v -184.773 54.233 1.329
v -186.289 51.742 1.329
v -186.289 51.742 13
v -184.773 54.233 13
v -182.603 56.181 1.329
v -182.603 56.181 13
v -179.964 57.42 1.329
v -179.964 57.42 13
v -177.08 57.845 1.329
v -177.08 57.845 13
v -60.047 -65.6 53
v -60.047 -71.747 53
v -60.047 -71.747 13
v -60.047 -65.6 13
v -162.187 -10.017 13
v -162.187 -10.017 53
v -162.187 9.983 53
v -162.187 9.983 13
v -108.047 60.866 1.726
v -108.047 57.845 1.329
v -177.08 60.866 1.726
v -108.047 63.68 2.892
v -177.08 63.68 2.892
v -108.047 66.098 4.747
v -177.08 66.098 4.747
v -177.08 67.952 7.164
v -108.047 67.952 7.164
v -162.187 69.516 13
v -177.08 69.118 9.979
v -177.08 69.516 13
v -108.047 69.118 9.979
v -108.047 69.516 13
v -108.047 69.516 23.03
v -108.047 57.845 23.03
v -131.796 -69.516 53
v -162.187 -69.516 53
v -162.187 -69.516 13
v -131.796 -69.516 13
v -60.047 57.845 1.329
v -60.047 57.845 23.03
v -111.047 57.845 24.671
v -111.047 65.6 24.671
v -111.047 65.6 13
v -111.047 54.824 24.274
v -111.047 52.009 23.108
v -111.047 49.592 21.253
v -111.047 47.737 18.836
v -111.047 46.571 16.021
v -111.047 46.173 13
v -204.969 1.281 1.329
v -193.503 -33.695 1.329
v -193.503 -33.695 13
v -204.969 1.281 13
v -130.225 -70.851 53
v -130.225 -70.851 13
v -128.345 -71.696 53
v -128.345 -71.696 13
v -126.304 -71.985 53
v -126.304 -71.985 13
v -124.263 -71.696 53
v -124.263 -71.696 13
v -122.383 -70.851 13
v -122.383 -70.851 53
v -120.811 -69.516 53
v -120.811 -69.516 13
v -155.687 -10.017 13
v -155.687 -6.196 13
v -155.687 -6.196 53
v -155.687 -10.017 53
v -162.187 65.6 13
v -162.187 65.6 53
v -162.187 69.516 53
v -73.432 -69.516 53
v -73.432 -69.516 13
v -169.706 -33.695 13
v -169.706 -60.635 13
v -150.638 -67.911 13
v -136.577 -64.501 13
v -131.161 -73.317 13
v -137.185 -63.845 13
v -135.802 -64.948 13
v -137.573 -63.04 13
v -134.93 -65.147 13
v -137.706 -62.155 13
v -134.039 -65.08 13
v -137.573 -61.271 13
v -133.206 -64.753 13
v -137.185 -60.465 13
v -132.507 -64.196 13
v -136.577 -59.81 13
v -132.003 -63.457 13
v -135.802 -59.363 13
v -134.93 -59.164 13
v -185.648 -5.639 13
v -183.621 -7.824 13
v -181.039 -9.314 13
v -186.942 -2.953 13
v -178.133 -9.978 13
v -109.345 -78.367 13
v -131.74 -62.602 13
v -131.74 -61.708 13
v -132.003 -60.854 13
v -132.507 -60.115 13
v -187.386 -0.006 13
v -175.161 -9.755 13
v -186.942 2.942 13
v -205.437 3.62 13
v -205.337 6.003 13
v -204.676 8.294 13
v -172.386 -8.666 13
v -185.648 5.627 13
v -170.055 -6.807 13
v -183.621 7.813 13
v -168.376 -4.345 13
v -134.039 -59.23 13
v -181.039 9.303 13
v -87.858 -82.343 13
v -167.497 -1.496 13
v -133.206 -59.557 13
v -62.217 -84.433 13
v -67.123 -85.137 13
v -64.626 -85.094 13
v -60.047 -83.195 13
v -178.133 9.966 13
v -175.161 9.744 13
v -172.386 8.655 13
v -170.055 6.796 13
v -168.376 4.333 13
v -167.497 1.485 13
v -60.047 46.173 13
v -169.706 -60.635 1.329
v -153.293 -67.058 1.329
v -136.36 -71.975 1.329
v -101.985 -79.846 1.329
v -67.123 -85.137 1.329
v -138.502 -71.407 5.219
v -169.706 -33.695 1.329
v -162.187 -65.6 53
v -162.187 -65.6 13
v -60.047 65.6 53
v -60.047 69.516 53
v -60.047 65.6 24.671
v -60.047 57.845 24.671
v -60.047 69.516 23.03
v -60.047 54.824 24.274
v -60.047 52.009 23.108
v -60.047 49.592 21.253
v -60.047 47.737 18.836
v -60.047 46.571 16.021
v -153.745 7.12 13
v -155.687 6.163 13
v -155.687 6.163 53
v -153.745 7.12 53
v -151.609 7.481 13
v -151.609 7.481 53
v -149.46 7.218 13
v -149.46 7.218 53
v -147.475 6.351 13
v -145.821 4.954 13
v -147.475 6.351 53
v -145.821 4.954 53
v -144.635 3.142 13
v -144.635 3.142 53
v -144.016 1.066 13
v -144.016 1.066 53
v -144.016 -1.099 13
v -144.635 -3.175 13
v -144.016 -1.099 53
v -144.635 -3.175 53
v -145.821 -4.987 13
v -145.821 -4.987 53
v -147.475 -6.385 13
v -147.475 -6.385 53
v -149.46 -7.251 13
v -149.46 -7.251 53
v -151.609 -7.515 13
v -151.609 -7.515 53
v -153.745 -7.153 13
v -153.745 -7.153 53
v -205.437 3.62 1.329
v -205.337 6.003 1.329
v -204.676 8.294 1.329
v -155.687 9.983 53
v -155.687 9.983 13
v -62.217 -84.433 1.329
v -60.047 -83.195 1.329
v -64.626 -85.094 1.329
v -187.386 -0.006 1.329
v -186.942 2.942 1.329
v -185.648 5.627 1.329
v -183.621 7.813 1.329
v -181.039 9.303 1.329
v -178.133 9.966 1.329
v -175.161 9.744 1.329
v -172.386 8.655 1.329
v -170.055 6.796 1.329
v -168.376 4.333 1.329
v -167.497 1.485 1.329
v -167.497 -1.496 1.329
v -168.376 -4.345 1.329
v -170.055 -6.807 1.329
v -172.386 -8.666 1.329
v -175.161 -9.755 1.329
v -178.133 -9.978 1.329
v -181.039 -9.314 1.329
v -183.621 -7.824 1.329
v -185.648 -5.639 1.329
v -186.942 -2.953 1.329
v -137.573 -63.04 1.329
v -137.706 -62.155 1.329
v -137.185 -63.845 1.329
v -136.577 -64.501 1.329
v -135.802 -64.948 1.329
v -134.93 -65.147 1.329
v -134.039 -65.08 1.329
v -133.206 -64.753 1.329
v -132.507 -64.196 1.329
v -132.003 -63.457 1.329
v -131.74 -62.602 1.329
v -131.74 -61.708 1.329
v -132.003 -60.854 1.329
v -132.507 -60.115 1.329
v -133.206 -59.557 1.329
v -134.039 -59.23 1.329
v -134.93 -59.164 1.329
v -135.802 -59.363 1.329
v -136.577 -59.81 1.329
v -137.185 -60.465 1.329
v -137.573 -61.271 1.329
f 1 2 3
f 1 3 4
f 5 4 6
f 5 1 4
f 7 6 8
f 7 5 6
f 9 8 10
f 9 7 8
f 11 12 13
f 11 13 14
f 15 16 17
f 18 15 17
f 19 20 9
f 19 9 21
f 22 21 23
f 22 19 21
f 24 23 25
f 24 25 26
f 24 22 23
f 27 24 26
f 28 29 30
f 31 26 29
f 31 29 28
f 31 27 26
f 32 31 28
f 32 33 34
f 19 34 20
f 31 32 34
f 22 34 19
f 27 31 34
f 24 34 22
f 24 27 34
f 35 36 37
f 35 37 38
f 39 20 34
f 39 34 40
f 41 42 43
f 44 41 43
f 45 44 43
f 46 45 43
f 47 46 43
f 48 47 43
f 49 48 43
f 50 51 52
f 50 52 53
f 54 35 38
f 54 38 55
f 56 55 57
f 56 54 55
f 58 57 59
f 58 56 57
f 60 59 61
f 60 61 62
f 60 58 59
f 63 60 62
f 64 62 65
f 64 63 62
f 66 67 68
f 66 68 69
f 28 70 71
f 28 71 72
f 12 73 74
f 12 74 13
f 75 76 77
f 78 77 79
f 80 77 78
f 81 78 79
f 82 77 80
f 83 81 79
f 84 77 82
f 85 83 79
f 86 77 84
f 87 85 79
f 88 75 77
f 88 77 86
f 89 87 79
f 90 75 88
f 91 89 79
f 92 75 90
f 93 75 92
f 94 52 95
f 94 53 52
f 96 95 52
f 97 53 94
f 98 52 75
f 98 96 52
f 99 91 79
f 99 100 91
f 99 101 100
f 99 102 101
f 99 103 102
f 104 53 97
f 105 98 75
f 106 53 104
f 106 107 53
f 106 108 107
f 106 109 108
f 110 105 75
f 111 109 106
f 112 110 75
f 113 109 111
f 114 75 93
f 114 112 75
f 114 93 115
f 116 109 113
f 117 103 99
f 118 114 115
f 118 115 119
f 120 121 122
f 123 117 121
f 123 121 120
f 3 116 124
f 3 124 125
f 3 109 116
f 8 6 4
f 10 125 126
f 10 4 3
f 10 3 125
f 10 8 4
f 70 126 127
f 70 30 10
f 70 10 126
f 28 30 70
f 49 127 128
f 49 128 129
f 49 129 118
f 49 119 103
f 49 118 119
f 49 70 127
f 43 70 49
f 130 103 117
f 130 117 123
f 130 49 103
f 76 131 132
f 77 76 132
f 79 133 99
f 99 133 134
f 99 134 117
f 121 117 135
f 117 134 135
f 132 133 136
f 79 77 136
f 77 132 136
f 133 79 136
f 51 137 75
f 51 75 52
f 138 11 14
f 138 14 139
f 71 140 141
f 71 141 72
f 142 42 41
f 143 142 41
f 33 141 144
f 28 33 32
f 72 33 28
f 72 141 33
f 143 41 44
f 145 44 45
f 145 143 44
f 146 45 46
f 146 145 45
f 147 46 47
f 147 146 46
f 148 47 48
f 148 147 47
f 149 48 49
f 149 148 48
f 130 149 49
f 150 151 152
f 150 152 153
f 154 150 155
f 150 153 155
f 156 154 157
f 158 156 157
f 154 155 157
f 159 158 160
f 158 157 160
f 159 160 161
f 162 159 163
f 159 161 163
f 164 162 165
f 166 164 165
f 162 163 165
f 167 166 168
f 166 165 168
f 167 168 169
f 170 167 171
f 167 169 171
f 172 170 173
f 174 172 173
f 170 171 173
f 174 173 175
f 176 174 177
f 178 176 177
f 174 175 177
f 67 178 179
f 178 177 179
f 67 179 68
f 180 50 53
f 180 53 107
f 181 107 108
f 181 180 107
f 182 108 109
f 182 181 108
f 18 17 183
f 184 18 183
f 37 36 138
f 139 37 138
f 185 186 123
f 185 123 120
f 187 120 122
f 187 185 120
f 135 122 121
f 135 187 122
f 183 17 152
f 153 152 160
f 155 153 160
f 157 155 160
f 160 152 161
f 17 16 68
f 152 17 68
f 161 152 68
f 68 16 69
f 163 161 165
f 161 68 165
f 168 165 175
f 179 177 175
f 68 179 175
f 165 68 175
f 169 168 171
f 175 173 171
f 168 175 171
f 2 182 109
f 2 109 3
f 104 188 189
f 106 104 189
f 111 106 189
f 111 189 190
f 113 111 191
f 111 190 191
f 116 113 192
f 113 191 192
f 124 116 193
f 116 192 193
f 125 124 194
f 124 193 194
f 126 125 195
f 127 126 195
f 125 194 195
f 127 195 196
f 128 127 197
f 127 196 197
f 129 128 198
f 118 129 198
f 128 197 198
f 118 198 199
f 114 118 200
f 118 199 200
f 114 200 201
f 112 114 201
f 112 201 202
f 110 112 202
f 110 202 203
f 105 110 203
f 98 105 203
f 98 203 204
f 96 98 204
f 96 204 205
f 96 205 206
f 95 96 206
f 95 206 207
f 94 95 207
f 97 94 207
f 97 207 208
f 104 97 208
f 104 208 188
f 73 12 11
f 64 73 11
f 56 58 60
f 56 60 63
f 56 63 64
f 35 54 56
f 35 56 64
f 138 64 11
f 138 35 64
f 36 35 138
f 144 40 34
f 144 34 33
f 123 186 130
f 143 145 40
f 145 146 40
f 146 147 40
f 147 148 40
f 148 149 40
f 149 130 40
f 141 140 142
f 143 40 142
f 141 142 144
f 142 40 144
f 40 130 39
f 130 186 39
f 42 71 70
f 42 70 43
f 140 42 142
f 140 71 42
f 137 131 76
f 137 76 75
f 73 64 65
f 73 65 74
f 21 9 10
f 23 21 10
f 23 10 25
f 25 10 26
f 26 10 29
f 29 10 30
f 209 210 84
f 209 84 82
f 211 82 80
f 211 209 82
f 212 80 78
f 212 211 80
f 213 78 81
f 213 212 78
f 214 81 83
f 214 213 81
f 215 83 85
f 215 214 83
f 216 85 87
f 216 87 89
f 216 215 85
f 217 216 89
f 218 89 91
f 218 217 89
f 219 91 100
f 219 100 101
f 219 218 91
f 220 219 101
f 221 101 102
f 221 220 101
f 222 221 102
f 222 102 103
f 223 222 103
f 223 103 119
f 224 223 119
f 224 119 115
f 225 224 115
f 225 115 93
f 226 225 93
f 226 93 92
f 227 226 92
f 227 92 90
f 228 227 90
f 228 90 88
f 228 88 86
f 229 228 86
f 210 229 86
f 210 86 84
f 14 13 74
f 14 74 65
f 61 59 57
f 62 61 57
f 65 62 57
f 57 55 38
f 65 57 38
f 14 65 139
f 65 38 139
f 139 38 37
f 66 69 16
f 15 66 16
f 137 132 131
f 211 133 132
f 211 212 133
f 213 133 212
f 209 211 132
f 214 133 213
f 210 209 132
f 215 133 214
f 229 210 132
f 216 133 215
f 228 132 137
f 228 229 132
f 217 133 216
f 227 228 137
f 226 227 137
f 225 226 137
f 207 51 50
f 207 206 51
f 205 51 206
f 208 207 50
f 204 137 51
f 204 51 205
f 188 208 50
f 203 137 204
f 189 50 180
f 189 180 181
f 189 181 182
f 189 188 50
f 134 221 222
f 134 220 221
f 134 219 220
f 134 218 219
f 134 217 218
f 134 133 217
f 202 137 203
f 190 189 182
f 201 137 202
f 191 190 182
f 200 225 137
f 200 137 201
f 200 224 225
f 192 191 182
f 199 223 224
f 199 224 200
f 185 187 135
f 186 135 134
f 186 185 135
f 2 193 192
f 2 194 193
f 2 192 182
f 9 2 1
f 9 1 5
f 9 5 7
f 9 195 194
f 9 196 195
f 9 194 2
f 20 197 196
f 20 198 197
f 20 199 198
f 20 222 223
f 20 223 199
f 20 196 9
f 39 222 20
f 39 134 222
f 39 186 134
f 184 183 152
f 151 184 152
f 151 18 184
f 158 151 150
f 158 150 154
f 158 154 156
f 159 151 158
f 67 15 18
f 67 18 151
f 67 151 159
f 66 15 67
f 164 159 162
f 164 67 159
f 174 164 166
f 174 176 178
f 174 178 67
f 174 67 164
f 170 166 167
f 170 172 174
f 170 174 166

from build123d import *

# Parameters (mm, degrees)
EXTRUDE_1_DEPTH     = 40
EXTRUDE_1_2_DEPTH   = 40
EXTRUDE_1_3_DEPTH   = 40
SKETCH_2_R          = 3
EXTRUDE_2_DEPTH     = 13
EXTRUDE_3_DEPTH     = 148.86088
EXTRUDE_4_DEPTH     = 55
SKETCH_6_W          = 23.030106463
SKETCH_6_H          = 11.671315475
CUT_EXTRUDE_1_DEPTH = 52
SKETCH_7_W          = 1.171392603
SKETCH_7_H          = 3.916398917
CUT_EXTRUDE_2_DEPTH = 52
SKETCH_8_W          = 1.171392603
SKETCH_8_H          = 7.044464959
CUT_EXTRUDE_3_DEPTH = 52
CUT_EXTRUDE_4_DEPTH = 40
SKETCH_11_W         = 1.328684526
SKETCH_11_H         = 148.506593242
CUT_EXTRUDE_5_DEPTH = 160
SKETCH_12_W         = 4
SKETCH_12_H         = 162.281264585
CUT_EXTRUDE_6_DEPTH = 160
SKETCH_13_R         = 10
CUT_EXTRUDE_8_DEPTH = 32
SKETCH_14_W         = 27.828077966
SKETCH_14_H         = 11.671315475
CUT_EXTRUDE_9_DEPTH = 18


with BuildPart() as part:
    # Эскиз3 → Бобышка-Вытянуть1 (new body)
    with BuildSketch(Plane(origin=(0, 0, 53), x_dir=(-1, 0, 0), z_dir=(0, 0, 1))):
        Polygon((54.875373692, -65.599681844), (54.875373692, -69.516080761), (204.631843366, -69.516080761), (204.907646106, -65.599681844), align=None)
    extrude(amount=-EXTRUDE_1_DEPTH)



with BuildPart() as body_2:
    # Эскиз3 → Extrude 1 2 (new body)
    with BuildSketch(Plane(origin=(0, 0, 53), x_dir=(-1, 0, 0), z_dir=(0, 0, 1))):
        with BuildLine():
            Line((54.875373692, 72.608931758), (54.875373692, 65.599681844))
            Line((54.875373692, 65.599681844), (133.584399888, 65.599681844))
            Line((133.584399888, 65.599681844), (204.907646106, 65.599681844))
            Line((204.907646106, 65.599681844), (204.631843366, 69.516080761))
            Line((204.631843366, 69.516080761), (131.796304317, 69.516080761))
            ThreePointArc((131.796304317, 69.516080761), (126.303865044, 71.985274815), (120.811425771, 69.516080761))
            Line((120.811425771, 69.516080761), (73.432479677, 69.516080761))
            Line((73.432479677, 69.516080761), (54.875373692, 72.608931758))
        make_face()
    extrude(amount=-EXTRUDE_1_2_DEPTH)

    # Эскиз8 → Вырез-Вытянуть3 (cut)
    with BuildSketch(Plane(origin=(0, 0, 13), x_dir=(-1, 0, 0), z_dir=(0, 0, -1))):
        with Locations((55.461069994, -69.121914323)):
            Rectangle(SKETCH_8_W, SKETCH_8_H)
    extrude(amount=-CUT_EXTRUDE_3_DEPTH, mode=Mode.SUBTRACT)


with BuildPart() as body_3:
    # Эскиз3 → Extrude 1 3 (new body)
    with BuildSketch(Plane(origin=(0, 0, 53), x_dir=(-1, 0, 0), z_dir=(0, 0, 1))):
        with BuildLine():
            Line((155.687413664, 10.016575084), (162.186830452, 10.016575084))
            Line((162.186830452, 10.016575084), (162.186830452, -9.983424916))
            Line((162.186830452, -9.983424916), (155.687413664, -9.983424916))
            Line((155.687413664, -9.983424916), (155.687413664, -6.162827902))
            ThreePointArc((155.687413664, -6.162827902), (143.937122058, 0.016575084), (155.687413664, 6.19597807))
            Line((155.687413664, 6.19597807), (155.687413664, 10.016575084))
        make_face()
    extrude(amount=-EXTRUDE_1_3_DEPTH)


with BuildPart() as body_4:
    # Эскиз2 → Бобышка-Вытянуть2 (new body)
    with BuildSketch(Plane.XY):
        with BuildLine():
            Line((-56.046766295, 57.844765286), (-56.046766295, -75.195150142))
            ThreePointArc((-56.046766295, -75.195150142), (-59.367136966, -82.637095589), (-67.123276701, -85.137037556))
            add(Edge.make_bspline(
                [(-169.706213848, -60.635244362), (-159.663451251, -65.329375592), (-148.333852624, -68.807240721), (-114.322706555, -77.808926564), (-90.368141829, -82.620076926), (-67.123276701, -85.137037556)],
                knots=[0.055135266, 0.055135266, 0.055135266, 0.055135266, 0.172676281, 0.181905401, 0.42983809, 0.42983809, 0.42983809, 0.42983809], degree=3))
            Line((-169.706213848, -60.635244362), (-169.706213848, -33.694561876))
            Line((-169.706213848, -33.694561876), (-193.502816731, -33.694561876))
            Line((-193.502816731, -33.694561876), (-204.96911778, 1.281363609))
            ThreePointArc((-204.96911778, 1.281363609), (-205.458000207, 4.814198713), (-204.675999382, 8.293912006))
            Line((-204.675999382, 8.293912006), (-186.288842912, 51.742105172))
            ThreePointArc((-186.288842912, 51.742105172), (-182.603452695, 56.180633533), (-177.07956814, 57.844765286))
            Line((-177.07956814, 57.844765286), (-56.046766295, 57.844765286))
        make_face()
        with Locations(Location((-134.706213848, -62.155234714, 0), (0, 0, 180))):
            Circle(SKETCH_2_R, mode=Mode.SUBTRACT)
    extrude(amount=EXTRUDE_2_DEPTH)


with BuildPart() as part_1:
    add(part.part)

    add(body_4.part)  # Бобышка-Вытянуть3 merges body 4
    # Эскиз4 → Бобышка-Вытянуть3 (add)
    with BuildSketch(Plane(origin=(-56.046766295, 0, 0), x_dir=(0, 0, -1), z_dir=(1, 0, 0))):
        with BuildLine():
            Line((-21.7224351, 65.599681844), (-13, 65.599681844))
            Line((-13, 65.599681844), (-13, 57.844765286))
            Line((-13, 57.844765286), (-1.328684526, 57.844765286))
            ThreePointArc((-1.328684526, 57.844765286), (-8.851668218, 68.753979205), (-21.7224351, 65.599681844))
        make_face()
    extrude(amount=-EXTRUDE_3_DEPTH)

    # Эскиз5 → Бобышка-Вытянуть4 (add)
    with BuildSketch(Plane(origin=(-56.046766295, 0, 0), x_dir=(0, 0, -1), z_dir=(1, 0, 0))):
        with BuildLine():
            Line((-13, 69.516080761), (-24.671315474, 69.516080761))
            Line((-24.671315474, 69.516080761), (-24.671315474, 57.844765286))
            ThreePointArc((-24.671315474, 57.844765286), (-4.747133683, 49.591898969), (-13, 69.516080761))
        make_face()
    extrude(amount=-EXTRUDE_4_DEPTH)

    # Эскиз6 → Вырез-Вытянуть1 (cut)
    with BuildSketch(Plane(origin=(-56.046766295, 0, 0), x_dir=(0, 0, -1), z_dir=(1, 0, 0))):
        with Locations((-11.515053232, 63.680423023)):
            Rectangle(SKETCH_6_W, SKETCH_6_H)
    extrude(amount=-CUT_EXTRUDE_1_DEPTH, mode=Mode.SUBTRACT)

    # Эскиз7 → Вырез-Вытянуть2 (cut)
    with BuildSketch(Plane(origin=(0, 0, 13), x_dir=(-1, 0, 0), z_dir=(0, 0, -1))):
        with Locations((55.461069994, 67.557881302)):
            Rectangle(SKETCH_7_W, SKETCH_7_H)
    extrude(amount=-CUT_EXTRUDE_2_DEPTH, mode=Mode.SUBTRACT)


with BuildPart() as cut_extrude_4_tool:
    # Эскиз9 → Вырез-Вытянуть4 (new body)
    with BuildSketch(Plane.XY.offset(53)):
        Polygon((-162.186830452, 9.812396247), (-162.186830452, 78.38916829), (-213.765652488, 78.38916829), (-213.765652488, -81.254607488), (-162.186830452, -81.254607488), align=None)
    extrude(amount=-CUT_EXTRUDE_4_DEPTH)


with BuildPart() as part_2:
    add(part_1.part)

    # Вырез-Вытянуть4: cut by cut_extrude_4_tool
    add(cut_extrude_4_tool.part, mode=Mode.SUBTRACT)

    # Эскиз11 → Вырез-Вытянуть5 (cut)
    with BuildSketch(Plane(origin=(-56.046766295, 0, 0), x_dir=(0, 0, -1), z_dir=(1, 0, 0))):
        with Locations((-0.664342263, -16.408531335)):
            Rectangle(SKETCH_11_W, SKETCH_11_H)
    extrude(amount=-CUT_EXTRUDE_5_DEPTH, mode=Mode.SUBTRACT)


with BuildPart() as body_2_1:
    add(body_2.part)

    # Вырез-Вытянуть4: cut by cut_extrude_4_tool
    add(cut_extrude_4_tool.part, mode=Mode.SUBTRACT)


with BuildPart() as cut_extrude_6_tool:
    # Эскиз12 → Вырез-Вытянуть6 (new body)
    with BuildSketch(Plane(origin=(0, 0, 1.328684526), x_dir=(-1, 0, 0), z_dir=(0, 0, -1))):
        with Locations((58.046766295, -11.624551532)):
            Rectangle(SKETCH_12_W, SKETCH_12_H)
    extrude(amount=-CUT_EXTRUDE_6_DEPTH)


with BuildPart() as part_3:
    add(part_2.part)

    # Вырез-Вытянуть6: cut by cut_extrude_6_tool
    add(cut_extrude_6_tool.part, mode=Mode.SUBTRACT)

    # Эскиз13 → Вырез-Вытянуть8 (cut)
    with BuildSketch(Plane(origin=(0, 0, 1.328684526), x_dir=(-1, 0, 0), z_dir=(0, 0, -1))):
        with Locations((177.385777156, -0.005707992)):
            Circle(SKETCH_13_R)
    extrude(amount=-CUT_EXTRUDE_8_DEPTH, mode=Mode.SUBTRACT)

    # Эскиз14 → Вырез-Вытянуть9 (cut)
    with BuildSketch(Plane.XY.offset(13)):
        with Locations((-190.993607123, 63.680423023)):
            Rectangle(SKETCH_14_W, SKETCH_14_H)
    extrude(amount=-CUT_EXTRUDE_9_DEPTH, mode=Mode.SUBTRACT)


with BuildPart() as body_2_2:
    add(body_2_1.part)

    # Вырез-Вытянуть6: cut by cut_extrude_6_tool
    add(cut_extrude_6_tool.part, mode=Mode.SUBTRACT)


solid = Compound([body_3.part, part_3.part, body_2_2.part])
